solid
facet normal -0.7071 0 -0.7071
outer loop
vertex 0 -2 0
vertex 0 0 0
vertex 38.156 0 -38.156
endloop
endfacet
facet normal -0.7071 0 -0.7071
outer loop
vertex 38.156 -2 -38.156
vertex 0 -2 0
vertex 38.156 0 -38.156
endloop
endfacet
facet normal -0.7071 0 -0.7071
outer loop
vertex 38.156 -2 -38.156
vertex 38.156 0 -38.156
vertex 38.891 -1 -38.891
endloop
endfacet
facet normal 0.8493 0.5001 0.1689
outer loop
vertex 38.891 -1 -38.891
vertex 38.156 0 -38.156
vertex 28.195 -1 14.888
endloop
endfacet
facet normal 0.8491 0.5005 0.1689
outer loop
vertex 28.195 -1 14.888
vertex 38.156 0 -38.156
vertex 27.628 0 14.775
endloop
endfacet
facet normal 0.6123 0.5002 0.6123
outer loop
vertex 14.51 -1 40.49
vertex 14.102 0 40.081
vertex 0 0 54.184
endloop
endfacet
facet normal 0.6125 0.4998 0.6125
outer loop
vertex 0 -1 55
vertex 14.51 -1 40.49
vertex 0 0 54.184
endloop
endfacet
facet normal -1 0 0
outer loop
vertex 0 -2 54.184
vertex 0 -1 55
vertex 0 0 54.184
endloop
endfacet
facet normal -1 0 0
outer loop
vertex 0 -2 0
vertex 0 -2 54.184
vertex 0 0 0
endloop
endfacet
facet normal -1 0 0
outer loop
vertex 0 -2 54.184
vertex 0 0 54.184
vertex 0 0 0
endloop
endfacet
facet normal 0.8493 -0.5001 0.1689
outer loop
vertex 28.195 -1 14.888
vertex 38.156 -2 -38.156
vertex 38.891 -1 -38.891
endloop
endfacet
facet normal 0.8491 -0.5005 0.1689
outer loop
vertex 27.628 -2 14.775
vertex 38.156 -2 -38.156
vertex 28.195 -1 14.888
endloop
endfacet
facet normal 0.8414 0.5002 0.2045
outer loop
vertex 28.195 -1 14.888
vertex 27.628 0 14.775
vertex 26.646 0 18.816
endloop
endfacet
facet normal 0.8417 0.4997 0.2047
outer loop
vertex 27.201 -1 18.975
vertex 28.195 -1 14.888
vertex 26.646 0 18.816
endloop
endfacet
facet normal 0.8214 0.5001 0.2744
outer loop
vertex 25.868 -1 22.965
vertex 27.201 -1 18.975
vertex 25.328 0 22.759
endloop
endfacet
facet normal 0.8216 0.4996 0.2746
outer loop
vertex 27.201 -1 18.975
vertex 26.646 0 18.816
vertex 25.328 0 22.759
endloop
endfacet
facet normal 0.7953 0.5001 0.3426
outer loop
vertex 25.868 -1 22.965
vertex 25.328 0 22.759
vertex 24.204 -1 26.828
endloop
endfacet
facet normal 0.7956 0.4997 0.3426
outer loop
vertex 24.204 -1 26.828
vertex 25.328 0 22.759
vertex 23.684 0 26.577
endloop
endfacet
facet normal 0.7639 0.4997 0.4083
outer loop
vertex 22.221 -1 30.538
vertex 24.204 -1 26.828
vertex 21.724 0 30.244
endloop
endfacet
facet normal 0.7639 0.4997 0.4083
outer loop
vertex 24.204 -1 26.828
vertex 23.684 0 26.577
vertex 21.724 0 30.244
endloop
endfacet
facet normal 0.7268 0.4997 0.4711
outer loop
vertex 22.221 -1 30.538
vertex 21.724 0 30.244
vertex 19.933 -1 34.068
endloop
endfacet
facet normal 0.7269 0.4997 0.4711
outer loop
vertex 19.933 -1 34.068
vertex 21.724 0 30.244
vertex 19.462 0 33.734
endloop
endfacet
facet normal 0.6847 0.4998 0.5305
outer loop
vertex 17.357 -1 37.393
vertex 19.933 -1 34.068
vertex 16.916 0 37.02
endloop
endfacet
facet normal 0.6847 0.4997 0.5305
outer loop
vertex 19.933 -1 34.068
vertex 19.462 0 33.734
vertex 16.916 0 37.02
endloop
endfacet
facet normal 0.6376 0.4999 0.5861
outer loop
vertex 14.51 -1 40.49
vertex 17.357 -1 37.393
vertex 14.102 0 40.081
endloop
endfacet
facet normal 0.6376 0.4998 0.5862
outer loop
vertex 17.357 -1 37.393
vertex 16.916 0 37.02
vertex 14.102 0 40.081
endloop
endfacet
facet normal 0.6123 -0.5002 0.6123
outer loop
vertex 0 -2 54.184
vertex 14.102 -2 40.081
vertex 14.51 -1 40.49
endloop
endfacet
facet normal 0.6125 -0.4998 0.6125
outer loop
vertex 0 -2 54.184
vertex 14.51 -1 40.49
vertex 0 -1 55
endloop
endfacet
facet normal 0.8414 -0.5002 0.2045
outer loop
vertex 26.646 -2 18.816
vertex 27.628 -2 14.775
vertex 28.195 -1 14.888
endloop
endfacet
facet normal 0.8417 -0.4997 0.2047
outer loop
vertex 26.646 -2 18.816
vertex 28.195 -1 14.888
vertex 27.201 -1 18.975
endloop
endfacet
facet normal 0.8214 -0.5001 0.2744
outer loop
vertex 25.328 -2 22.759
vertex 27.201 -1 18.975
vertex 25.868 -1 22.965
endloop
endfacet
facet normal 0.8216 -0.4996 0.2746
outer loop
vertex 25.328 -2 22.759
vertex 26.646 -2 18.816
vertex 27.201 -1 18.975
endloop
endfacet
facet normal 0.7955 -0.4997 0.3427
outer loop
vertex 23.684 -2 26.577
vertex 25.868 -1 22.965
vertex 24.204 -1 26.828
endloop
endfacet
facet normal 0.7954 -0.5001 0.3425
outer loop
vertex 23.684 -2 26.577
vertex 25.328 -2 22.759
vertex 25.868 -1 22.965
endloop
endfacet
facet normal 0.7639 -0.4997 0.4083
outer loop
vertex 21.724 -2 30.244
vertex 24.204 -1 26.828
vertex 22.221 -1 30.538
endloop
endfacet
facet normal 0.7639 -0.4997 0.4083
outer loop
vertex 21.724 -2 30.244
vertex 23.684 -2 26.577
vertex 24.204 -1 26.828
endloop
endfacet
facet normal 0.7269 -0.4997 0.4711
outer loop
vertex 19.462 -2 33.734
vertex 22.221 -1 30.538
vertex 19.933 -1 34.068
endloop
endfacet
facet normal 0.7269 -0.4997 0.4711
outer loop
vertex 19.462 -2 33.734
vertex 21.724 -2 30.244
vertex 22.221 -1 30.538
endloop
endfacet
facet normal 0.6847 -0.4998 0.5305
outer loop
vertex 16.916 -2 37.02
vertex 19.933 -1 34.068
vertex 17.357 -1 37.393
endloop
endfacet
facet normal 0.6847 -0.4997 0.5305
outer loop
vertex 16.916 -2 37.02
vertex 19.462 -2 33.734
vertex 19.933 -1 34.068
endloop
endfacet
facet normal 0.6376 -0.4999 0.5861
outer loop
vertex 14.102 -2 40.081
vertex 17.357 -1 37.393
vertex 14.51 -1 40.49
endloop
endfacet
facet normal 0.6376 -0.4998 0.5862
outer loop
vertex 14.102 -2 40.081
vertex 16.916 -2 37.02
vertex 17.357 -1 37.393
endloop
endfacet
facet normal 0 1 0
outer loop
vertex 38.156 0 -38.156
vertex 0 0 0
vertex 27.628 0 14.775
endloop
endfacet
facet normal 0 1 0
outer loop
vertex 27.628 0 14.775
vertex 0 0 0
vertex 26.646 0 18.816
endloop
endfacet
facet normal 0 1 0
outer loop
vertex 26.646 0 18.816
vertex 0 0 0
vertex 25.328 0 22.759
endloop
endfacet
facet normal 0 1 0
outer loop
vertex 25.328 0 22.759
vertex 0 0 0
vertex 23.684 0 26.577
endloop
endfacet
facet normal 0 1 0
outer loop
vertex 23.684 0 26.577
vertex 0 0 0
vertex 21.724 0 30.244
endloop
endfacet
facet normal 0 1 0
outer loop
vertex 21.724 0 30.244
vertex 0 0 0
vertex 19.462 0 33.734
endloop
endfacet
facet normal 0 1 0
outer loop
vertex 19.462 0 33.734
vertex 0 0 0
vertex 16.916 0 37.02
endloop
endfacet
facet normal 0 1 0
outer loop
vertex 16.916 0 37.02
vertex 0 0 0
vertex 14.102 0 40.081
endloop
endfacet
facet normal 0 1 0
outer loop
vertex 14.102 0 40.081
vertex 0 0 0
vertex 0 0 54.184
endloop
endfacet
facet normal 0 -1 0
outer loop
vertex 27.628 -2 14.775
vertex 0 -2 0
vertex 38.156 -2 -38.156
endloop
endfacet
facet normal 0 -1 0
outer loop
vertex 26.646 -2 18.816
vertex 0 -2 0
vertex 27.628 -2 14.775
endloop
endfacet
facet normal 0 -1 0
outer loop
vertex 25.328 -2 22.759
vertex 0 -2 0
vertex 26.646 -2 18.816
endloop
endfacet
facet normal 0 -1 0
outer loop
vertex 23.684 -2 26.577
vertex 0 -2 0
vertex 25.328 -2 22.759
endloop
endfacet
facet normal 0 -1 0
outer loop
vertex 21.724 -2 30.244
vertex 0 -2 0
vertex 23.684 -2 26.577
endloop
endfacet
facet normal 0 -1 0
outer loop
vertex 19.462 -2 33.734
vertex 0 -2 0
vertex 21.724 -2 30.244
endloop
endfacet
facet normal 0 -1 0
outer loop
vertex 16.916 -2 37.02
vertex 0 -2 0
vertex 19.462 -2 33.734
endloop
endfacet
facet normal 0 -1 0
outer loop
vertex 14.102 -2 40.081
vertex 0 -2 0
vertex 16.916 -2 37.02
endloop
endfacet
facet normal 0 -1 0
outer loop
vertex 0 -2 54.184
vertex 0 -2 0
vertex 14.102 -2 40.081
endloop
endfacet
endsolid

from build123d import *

# Parameters (mm, degrees)
F1_DEPTH = 2
F2_R     = 50
F3_SIZE2 = 0.57734
F3_SIZE  = 0.99999


# Not quite as in the source:
# - a fillet or chamfer is up to 0.001 mm smaller than in the source, because OpenCascade refuses the exact size


with BuildPart() as f1:
    # F0 (on Front) → F1 (new body)
    with BuildSketch(Plane.XZ):
        Polygon((0, 55), (0, 0), (38.8908729653, -38.8908729653), (25.2356788824, 29.7643211176), align=None)
    extrude(amount=F1_DEPTH)

    # F2
    f2_edges = [f1.edges().sort_by_distance(p)[0] for p in [
        (25.235679, -1, 29.764321),
    ]]
    fillet(f2_edges, radius=F2_R)

    # F3 (size 1 and 0.5773502692 in the source; OpenCascade refuses exactly that, so slightly less here)
    f3_edges = [f1.edges().sort_by_distance(p)[0] for p in [
        (7.255218, -2, 47.744782),
        (7.255218, 0, 47.744782),
    ]]
    f3_side = f1.faces().sort_by_distance((7.255218, -1, 47.744782))[0]
    chamfer(f3_edges, length=F3_SIZE, length2=F3_SIZE2, reference=f3_side)


solid = f1.part
